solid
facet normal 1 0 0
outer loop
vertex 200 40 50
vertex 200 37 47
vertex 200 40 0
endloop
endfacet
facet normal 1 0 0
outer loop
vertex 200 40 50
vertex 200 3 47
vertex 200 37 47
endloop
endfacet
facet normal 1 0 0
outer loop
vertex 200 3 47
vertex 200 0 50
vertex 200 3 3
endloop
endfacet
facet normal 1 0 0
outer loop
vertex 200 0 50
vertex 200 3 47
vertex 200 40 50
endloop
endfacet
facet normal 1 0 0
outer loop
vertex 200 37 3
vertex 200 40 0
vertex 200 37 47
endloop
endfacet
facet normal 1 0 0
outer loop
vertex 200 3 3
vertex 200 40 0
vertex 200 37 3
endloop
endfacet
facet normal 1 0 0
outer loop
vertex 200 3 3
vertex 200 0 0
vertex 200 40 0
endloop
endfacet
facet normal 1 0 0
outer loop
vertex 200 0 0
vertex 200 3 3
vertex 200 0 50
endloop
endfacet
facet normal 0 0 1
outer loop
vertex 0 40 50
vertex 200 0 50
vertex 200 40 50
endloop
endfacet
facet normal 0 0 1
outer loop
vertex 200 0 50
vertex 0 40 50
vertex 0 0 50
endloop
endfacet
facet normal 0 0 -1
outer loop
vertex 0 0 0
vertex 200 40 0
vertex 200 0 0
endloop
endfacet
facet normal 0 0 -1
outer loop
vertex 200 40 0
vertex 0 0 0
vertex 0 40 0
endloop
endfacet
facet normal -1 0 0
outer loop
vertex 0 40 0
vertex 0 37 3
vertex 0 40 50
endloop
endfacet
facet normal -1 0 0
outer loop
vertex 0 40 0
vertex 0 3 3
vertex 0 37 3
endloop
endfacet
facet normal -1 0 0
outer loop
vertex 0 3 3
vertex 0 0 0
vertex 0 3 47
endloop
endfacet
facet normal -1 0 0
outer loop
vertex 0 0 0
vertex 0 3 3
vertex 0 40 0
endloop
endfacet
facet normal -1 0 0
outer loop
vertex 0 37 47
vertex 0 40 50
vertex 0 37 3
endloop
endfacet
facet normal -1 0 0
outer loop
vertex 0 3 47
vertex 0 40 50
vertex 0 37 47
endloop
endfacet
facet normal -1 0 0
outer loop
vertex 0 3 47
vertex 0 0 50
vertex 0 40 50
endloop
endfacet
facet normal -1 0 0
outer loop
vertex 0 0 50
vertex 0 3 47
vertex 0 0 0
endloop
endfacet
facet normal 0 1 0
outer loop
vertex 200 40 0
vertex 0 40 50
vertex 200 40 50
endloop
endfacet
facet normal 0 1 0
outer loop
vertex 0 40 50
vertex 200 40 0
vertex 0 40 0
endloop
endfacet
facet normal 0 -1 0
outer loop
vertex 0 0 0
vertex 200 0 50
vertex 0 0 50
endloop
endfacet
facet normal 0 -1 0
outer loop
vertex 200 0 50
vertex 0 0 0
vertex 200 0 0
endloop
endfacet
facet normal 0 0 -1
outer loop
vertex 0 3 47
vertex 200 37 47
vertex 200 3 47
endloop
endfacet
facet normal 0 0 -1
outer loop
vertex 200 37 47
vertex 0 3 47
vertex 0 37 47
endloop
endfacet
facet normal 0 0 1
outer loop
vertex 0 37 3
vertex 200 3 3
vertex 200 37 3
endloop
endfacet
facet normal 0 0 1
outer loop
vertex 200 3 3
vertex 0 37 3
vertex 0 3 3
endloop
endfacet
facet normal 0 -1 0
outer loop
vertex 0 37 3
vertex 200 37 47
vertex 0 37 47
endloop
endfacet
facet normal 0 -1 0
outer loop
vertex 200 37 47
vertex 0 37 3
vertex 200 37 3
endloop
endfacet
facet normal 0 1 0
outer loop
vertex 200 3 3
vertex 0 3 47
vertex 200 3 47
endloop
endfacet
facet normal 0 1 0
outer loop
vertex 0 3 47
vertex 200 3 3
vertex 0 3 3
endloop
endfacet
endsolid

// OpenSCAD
$fn = 32;

// ----------------------------------------------------------------------
// Box beam: 200-250 mm hollow beam
// ----------------------------------------------------------------------

// --- parameters (mm) ---
beam_l = 200;             // beam length, X
beam_w = 40;              // beam width, Y
beam_h = 50;              // beam height, Z
wall = 3;                 // wall thickness

difference() {
  cube([beam_l, beam_w, beam_h]);
  translate([-1, wall, wall])
    cube([beam_l + 2, beam_w - 2 * wall, beam_h - 2 * wall]);
}
